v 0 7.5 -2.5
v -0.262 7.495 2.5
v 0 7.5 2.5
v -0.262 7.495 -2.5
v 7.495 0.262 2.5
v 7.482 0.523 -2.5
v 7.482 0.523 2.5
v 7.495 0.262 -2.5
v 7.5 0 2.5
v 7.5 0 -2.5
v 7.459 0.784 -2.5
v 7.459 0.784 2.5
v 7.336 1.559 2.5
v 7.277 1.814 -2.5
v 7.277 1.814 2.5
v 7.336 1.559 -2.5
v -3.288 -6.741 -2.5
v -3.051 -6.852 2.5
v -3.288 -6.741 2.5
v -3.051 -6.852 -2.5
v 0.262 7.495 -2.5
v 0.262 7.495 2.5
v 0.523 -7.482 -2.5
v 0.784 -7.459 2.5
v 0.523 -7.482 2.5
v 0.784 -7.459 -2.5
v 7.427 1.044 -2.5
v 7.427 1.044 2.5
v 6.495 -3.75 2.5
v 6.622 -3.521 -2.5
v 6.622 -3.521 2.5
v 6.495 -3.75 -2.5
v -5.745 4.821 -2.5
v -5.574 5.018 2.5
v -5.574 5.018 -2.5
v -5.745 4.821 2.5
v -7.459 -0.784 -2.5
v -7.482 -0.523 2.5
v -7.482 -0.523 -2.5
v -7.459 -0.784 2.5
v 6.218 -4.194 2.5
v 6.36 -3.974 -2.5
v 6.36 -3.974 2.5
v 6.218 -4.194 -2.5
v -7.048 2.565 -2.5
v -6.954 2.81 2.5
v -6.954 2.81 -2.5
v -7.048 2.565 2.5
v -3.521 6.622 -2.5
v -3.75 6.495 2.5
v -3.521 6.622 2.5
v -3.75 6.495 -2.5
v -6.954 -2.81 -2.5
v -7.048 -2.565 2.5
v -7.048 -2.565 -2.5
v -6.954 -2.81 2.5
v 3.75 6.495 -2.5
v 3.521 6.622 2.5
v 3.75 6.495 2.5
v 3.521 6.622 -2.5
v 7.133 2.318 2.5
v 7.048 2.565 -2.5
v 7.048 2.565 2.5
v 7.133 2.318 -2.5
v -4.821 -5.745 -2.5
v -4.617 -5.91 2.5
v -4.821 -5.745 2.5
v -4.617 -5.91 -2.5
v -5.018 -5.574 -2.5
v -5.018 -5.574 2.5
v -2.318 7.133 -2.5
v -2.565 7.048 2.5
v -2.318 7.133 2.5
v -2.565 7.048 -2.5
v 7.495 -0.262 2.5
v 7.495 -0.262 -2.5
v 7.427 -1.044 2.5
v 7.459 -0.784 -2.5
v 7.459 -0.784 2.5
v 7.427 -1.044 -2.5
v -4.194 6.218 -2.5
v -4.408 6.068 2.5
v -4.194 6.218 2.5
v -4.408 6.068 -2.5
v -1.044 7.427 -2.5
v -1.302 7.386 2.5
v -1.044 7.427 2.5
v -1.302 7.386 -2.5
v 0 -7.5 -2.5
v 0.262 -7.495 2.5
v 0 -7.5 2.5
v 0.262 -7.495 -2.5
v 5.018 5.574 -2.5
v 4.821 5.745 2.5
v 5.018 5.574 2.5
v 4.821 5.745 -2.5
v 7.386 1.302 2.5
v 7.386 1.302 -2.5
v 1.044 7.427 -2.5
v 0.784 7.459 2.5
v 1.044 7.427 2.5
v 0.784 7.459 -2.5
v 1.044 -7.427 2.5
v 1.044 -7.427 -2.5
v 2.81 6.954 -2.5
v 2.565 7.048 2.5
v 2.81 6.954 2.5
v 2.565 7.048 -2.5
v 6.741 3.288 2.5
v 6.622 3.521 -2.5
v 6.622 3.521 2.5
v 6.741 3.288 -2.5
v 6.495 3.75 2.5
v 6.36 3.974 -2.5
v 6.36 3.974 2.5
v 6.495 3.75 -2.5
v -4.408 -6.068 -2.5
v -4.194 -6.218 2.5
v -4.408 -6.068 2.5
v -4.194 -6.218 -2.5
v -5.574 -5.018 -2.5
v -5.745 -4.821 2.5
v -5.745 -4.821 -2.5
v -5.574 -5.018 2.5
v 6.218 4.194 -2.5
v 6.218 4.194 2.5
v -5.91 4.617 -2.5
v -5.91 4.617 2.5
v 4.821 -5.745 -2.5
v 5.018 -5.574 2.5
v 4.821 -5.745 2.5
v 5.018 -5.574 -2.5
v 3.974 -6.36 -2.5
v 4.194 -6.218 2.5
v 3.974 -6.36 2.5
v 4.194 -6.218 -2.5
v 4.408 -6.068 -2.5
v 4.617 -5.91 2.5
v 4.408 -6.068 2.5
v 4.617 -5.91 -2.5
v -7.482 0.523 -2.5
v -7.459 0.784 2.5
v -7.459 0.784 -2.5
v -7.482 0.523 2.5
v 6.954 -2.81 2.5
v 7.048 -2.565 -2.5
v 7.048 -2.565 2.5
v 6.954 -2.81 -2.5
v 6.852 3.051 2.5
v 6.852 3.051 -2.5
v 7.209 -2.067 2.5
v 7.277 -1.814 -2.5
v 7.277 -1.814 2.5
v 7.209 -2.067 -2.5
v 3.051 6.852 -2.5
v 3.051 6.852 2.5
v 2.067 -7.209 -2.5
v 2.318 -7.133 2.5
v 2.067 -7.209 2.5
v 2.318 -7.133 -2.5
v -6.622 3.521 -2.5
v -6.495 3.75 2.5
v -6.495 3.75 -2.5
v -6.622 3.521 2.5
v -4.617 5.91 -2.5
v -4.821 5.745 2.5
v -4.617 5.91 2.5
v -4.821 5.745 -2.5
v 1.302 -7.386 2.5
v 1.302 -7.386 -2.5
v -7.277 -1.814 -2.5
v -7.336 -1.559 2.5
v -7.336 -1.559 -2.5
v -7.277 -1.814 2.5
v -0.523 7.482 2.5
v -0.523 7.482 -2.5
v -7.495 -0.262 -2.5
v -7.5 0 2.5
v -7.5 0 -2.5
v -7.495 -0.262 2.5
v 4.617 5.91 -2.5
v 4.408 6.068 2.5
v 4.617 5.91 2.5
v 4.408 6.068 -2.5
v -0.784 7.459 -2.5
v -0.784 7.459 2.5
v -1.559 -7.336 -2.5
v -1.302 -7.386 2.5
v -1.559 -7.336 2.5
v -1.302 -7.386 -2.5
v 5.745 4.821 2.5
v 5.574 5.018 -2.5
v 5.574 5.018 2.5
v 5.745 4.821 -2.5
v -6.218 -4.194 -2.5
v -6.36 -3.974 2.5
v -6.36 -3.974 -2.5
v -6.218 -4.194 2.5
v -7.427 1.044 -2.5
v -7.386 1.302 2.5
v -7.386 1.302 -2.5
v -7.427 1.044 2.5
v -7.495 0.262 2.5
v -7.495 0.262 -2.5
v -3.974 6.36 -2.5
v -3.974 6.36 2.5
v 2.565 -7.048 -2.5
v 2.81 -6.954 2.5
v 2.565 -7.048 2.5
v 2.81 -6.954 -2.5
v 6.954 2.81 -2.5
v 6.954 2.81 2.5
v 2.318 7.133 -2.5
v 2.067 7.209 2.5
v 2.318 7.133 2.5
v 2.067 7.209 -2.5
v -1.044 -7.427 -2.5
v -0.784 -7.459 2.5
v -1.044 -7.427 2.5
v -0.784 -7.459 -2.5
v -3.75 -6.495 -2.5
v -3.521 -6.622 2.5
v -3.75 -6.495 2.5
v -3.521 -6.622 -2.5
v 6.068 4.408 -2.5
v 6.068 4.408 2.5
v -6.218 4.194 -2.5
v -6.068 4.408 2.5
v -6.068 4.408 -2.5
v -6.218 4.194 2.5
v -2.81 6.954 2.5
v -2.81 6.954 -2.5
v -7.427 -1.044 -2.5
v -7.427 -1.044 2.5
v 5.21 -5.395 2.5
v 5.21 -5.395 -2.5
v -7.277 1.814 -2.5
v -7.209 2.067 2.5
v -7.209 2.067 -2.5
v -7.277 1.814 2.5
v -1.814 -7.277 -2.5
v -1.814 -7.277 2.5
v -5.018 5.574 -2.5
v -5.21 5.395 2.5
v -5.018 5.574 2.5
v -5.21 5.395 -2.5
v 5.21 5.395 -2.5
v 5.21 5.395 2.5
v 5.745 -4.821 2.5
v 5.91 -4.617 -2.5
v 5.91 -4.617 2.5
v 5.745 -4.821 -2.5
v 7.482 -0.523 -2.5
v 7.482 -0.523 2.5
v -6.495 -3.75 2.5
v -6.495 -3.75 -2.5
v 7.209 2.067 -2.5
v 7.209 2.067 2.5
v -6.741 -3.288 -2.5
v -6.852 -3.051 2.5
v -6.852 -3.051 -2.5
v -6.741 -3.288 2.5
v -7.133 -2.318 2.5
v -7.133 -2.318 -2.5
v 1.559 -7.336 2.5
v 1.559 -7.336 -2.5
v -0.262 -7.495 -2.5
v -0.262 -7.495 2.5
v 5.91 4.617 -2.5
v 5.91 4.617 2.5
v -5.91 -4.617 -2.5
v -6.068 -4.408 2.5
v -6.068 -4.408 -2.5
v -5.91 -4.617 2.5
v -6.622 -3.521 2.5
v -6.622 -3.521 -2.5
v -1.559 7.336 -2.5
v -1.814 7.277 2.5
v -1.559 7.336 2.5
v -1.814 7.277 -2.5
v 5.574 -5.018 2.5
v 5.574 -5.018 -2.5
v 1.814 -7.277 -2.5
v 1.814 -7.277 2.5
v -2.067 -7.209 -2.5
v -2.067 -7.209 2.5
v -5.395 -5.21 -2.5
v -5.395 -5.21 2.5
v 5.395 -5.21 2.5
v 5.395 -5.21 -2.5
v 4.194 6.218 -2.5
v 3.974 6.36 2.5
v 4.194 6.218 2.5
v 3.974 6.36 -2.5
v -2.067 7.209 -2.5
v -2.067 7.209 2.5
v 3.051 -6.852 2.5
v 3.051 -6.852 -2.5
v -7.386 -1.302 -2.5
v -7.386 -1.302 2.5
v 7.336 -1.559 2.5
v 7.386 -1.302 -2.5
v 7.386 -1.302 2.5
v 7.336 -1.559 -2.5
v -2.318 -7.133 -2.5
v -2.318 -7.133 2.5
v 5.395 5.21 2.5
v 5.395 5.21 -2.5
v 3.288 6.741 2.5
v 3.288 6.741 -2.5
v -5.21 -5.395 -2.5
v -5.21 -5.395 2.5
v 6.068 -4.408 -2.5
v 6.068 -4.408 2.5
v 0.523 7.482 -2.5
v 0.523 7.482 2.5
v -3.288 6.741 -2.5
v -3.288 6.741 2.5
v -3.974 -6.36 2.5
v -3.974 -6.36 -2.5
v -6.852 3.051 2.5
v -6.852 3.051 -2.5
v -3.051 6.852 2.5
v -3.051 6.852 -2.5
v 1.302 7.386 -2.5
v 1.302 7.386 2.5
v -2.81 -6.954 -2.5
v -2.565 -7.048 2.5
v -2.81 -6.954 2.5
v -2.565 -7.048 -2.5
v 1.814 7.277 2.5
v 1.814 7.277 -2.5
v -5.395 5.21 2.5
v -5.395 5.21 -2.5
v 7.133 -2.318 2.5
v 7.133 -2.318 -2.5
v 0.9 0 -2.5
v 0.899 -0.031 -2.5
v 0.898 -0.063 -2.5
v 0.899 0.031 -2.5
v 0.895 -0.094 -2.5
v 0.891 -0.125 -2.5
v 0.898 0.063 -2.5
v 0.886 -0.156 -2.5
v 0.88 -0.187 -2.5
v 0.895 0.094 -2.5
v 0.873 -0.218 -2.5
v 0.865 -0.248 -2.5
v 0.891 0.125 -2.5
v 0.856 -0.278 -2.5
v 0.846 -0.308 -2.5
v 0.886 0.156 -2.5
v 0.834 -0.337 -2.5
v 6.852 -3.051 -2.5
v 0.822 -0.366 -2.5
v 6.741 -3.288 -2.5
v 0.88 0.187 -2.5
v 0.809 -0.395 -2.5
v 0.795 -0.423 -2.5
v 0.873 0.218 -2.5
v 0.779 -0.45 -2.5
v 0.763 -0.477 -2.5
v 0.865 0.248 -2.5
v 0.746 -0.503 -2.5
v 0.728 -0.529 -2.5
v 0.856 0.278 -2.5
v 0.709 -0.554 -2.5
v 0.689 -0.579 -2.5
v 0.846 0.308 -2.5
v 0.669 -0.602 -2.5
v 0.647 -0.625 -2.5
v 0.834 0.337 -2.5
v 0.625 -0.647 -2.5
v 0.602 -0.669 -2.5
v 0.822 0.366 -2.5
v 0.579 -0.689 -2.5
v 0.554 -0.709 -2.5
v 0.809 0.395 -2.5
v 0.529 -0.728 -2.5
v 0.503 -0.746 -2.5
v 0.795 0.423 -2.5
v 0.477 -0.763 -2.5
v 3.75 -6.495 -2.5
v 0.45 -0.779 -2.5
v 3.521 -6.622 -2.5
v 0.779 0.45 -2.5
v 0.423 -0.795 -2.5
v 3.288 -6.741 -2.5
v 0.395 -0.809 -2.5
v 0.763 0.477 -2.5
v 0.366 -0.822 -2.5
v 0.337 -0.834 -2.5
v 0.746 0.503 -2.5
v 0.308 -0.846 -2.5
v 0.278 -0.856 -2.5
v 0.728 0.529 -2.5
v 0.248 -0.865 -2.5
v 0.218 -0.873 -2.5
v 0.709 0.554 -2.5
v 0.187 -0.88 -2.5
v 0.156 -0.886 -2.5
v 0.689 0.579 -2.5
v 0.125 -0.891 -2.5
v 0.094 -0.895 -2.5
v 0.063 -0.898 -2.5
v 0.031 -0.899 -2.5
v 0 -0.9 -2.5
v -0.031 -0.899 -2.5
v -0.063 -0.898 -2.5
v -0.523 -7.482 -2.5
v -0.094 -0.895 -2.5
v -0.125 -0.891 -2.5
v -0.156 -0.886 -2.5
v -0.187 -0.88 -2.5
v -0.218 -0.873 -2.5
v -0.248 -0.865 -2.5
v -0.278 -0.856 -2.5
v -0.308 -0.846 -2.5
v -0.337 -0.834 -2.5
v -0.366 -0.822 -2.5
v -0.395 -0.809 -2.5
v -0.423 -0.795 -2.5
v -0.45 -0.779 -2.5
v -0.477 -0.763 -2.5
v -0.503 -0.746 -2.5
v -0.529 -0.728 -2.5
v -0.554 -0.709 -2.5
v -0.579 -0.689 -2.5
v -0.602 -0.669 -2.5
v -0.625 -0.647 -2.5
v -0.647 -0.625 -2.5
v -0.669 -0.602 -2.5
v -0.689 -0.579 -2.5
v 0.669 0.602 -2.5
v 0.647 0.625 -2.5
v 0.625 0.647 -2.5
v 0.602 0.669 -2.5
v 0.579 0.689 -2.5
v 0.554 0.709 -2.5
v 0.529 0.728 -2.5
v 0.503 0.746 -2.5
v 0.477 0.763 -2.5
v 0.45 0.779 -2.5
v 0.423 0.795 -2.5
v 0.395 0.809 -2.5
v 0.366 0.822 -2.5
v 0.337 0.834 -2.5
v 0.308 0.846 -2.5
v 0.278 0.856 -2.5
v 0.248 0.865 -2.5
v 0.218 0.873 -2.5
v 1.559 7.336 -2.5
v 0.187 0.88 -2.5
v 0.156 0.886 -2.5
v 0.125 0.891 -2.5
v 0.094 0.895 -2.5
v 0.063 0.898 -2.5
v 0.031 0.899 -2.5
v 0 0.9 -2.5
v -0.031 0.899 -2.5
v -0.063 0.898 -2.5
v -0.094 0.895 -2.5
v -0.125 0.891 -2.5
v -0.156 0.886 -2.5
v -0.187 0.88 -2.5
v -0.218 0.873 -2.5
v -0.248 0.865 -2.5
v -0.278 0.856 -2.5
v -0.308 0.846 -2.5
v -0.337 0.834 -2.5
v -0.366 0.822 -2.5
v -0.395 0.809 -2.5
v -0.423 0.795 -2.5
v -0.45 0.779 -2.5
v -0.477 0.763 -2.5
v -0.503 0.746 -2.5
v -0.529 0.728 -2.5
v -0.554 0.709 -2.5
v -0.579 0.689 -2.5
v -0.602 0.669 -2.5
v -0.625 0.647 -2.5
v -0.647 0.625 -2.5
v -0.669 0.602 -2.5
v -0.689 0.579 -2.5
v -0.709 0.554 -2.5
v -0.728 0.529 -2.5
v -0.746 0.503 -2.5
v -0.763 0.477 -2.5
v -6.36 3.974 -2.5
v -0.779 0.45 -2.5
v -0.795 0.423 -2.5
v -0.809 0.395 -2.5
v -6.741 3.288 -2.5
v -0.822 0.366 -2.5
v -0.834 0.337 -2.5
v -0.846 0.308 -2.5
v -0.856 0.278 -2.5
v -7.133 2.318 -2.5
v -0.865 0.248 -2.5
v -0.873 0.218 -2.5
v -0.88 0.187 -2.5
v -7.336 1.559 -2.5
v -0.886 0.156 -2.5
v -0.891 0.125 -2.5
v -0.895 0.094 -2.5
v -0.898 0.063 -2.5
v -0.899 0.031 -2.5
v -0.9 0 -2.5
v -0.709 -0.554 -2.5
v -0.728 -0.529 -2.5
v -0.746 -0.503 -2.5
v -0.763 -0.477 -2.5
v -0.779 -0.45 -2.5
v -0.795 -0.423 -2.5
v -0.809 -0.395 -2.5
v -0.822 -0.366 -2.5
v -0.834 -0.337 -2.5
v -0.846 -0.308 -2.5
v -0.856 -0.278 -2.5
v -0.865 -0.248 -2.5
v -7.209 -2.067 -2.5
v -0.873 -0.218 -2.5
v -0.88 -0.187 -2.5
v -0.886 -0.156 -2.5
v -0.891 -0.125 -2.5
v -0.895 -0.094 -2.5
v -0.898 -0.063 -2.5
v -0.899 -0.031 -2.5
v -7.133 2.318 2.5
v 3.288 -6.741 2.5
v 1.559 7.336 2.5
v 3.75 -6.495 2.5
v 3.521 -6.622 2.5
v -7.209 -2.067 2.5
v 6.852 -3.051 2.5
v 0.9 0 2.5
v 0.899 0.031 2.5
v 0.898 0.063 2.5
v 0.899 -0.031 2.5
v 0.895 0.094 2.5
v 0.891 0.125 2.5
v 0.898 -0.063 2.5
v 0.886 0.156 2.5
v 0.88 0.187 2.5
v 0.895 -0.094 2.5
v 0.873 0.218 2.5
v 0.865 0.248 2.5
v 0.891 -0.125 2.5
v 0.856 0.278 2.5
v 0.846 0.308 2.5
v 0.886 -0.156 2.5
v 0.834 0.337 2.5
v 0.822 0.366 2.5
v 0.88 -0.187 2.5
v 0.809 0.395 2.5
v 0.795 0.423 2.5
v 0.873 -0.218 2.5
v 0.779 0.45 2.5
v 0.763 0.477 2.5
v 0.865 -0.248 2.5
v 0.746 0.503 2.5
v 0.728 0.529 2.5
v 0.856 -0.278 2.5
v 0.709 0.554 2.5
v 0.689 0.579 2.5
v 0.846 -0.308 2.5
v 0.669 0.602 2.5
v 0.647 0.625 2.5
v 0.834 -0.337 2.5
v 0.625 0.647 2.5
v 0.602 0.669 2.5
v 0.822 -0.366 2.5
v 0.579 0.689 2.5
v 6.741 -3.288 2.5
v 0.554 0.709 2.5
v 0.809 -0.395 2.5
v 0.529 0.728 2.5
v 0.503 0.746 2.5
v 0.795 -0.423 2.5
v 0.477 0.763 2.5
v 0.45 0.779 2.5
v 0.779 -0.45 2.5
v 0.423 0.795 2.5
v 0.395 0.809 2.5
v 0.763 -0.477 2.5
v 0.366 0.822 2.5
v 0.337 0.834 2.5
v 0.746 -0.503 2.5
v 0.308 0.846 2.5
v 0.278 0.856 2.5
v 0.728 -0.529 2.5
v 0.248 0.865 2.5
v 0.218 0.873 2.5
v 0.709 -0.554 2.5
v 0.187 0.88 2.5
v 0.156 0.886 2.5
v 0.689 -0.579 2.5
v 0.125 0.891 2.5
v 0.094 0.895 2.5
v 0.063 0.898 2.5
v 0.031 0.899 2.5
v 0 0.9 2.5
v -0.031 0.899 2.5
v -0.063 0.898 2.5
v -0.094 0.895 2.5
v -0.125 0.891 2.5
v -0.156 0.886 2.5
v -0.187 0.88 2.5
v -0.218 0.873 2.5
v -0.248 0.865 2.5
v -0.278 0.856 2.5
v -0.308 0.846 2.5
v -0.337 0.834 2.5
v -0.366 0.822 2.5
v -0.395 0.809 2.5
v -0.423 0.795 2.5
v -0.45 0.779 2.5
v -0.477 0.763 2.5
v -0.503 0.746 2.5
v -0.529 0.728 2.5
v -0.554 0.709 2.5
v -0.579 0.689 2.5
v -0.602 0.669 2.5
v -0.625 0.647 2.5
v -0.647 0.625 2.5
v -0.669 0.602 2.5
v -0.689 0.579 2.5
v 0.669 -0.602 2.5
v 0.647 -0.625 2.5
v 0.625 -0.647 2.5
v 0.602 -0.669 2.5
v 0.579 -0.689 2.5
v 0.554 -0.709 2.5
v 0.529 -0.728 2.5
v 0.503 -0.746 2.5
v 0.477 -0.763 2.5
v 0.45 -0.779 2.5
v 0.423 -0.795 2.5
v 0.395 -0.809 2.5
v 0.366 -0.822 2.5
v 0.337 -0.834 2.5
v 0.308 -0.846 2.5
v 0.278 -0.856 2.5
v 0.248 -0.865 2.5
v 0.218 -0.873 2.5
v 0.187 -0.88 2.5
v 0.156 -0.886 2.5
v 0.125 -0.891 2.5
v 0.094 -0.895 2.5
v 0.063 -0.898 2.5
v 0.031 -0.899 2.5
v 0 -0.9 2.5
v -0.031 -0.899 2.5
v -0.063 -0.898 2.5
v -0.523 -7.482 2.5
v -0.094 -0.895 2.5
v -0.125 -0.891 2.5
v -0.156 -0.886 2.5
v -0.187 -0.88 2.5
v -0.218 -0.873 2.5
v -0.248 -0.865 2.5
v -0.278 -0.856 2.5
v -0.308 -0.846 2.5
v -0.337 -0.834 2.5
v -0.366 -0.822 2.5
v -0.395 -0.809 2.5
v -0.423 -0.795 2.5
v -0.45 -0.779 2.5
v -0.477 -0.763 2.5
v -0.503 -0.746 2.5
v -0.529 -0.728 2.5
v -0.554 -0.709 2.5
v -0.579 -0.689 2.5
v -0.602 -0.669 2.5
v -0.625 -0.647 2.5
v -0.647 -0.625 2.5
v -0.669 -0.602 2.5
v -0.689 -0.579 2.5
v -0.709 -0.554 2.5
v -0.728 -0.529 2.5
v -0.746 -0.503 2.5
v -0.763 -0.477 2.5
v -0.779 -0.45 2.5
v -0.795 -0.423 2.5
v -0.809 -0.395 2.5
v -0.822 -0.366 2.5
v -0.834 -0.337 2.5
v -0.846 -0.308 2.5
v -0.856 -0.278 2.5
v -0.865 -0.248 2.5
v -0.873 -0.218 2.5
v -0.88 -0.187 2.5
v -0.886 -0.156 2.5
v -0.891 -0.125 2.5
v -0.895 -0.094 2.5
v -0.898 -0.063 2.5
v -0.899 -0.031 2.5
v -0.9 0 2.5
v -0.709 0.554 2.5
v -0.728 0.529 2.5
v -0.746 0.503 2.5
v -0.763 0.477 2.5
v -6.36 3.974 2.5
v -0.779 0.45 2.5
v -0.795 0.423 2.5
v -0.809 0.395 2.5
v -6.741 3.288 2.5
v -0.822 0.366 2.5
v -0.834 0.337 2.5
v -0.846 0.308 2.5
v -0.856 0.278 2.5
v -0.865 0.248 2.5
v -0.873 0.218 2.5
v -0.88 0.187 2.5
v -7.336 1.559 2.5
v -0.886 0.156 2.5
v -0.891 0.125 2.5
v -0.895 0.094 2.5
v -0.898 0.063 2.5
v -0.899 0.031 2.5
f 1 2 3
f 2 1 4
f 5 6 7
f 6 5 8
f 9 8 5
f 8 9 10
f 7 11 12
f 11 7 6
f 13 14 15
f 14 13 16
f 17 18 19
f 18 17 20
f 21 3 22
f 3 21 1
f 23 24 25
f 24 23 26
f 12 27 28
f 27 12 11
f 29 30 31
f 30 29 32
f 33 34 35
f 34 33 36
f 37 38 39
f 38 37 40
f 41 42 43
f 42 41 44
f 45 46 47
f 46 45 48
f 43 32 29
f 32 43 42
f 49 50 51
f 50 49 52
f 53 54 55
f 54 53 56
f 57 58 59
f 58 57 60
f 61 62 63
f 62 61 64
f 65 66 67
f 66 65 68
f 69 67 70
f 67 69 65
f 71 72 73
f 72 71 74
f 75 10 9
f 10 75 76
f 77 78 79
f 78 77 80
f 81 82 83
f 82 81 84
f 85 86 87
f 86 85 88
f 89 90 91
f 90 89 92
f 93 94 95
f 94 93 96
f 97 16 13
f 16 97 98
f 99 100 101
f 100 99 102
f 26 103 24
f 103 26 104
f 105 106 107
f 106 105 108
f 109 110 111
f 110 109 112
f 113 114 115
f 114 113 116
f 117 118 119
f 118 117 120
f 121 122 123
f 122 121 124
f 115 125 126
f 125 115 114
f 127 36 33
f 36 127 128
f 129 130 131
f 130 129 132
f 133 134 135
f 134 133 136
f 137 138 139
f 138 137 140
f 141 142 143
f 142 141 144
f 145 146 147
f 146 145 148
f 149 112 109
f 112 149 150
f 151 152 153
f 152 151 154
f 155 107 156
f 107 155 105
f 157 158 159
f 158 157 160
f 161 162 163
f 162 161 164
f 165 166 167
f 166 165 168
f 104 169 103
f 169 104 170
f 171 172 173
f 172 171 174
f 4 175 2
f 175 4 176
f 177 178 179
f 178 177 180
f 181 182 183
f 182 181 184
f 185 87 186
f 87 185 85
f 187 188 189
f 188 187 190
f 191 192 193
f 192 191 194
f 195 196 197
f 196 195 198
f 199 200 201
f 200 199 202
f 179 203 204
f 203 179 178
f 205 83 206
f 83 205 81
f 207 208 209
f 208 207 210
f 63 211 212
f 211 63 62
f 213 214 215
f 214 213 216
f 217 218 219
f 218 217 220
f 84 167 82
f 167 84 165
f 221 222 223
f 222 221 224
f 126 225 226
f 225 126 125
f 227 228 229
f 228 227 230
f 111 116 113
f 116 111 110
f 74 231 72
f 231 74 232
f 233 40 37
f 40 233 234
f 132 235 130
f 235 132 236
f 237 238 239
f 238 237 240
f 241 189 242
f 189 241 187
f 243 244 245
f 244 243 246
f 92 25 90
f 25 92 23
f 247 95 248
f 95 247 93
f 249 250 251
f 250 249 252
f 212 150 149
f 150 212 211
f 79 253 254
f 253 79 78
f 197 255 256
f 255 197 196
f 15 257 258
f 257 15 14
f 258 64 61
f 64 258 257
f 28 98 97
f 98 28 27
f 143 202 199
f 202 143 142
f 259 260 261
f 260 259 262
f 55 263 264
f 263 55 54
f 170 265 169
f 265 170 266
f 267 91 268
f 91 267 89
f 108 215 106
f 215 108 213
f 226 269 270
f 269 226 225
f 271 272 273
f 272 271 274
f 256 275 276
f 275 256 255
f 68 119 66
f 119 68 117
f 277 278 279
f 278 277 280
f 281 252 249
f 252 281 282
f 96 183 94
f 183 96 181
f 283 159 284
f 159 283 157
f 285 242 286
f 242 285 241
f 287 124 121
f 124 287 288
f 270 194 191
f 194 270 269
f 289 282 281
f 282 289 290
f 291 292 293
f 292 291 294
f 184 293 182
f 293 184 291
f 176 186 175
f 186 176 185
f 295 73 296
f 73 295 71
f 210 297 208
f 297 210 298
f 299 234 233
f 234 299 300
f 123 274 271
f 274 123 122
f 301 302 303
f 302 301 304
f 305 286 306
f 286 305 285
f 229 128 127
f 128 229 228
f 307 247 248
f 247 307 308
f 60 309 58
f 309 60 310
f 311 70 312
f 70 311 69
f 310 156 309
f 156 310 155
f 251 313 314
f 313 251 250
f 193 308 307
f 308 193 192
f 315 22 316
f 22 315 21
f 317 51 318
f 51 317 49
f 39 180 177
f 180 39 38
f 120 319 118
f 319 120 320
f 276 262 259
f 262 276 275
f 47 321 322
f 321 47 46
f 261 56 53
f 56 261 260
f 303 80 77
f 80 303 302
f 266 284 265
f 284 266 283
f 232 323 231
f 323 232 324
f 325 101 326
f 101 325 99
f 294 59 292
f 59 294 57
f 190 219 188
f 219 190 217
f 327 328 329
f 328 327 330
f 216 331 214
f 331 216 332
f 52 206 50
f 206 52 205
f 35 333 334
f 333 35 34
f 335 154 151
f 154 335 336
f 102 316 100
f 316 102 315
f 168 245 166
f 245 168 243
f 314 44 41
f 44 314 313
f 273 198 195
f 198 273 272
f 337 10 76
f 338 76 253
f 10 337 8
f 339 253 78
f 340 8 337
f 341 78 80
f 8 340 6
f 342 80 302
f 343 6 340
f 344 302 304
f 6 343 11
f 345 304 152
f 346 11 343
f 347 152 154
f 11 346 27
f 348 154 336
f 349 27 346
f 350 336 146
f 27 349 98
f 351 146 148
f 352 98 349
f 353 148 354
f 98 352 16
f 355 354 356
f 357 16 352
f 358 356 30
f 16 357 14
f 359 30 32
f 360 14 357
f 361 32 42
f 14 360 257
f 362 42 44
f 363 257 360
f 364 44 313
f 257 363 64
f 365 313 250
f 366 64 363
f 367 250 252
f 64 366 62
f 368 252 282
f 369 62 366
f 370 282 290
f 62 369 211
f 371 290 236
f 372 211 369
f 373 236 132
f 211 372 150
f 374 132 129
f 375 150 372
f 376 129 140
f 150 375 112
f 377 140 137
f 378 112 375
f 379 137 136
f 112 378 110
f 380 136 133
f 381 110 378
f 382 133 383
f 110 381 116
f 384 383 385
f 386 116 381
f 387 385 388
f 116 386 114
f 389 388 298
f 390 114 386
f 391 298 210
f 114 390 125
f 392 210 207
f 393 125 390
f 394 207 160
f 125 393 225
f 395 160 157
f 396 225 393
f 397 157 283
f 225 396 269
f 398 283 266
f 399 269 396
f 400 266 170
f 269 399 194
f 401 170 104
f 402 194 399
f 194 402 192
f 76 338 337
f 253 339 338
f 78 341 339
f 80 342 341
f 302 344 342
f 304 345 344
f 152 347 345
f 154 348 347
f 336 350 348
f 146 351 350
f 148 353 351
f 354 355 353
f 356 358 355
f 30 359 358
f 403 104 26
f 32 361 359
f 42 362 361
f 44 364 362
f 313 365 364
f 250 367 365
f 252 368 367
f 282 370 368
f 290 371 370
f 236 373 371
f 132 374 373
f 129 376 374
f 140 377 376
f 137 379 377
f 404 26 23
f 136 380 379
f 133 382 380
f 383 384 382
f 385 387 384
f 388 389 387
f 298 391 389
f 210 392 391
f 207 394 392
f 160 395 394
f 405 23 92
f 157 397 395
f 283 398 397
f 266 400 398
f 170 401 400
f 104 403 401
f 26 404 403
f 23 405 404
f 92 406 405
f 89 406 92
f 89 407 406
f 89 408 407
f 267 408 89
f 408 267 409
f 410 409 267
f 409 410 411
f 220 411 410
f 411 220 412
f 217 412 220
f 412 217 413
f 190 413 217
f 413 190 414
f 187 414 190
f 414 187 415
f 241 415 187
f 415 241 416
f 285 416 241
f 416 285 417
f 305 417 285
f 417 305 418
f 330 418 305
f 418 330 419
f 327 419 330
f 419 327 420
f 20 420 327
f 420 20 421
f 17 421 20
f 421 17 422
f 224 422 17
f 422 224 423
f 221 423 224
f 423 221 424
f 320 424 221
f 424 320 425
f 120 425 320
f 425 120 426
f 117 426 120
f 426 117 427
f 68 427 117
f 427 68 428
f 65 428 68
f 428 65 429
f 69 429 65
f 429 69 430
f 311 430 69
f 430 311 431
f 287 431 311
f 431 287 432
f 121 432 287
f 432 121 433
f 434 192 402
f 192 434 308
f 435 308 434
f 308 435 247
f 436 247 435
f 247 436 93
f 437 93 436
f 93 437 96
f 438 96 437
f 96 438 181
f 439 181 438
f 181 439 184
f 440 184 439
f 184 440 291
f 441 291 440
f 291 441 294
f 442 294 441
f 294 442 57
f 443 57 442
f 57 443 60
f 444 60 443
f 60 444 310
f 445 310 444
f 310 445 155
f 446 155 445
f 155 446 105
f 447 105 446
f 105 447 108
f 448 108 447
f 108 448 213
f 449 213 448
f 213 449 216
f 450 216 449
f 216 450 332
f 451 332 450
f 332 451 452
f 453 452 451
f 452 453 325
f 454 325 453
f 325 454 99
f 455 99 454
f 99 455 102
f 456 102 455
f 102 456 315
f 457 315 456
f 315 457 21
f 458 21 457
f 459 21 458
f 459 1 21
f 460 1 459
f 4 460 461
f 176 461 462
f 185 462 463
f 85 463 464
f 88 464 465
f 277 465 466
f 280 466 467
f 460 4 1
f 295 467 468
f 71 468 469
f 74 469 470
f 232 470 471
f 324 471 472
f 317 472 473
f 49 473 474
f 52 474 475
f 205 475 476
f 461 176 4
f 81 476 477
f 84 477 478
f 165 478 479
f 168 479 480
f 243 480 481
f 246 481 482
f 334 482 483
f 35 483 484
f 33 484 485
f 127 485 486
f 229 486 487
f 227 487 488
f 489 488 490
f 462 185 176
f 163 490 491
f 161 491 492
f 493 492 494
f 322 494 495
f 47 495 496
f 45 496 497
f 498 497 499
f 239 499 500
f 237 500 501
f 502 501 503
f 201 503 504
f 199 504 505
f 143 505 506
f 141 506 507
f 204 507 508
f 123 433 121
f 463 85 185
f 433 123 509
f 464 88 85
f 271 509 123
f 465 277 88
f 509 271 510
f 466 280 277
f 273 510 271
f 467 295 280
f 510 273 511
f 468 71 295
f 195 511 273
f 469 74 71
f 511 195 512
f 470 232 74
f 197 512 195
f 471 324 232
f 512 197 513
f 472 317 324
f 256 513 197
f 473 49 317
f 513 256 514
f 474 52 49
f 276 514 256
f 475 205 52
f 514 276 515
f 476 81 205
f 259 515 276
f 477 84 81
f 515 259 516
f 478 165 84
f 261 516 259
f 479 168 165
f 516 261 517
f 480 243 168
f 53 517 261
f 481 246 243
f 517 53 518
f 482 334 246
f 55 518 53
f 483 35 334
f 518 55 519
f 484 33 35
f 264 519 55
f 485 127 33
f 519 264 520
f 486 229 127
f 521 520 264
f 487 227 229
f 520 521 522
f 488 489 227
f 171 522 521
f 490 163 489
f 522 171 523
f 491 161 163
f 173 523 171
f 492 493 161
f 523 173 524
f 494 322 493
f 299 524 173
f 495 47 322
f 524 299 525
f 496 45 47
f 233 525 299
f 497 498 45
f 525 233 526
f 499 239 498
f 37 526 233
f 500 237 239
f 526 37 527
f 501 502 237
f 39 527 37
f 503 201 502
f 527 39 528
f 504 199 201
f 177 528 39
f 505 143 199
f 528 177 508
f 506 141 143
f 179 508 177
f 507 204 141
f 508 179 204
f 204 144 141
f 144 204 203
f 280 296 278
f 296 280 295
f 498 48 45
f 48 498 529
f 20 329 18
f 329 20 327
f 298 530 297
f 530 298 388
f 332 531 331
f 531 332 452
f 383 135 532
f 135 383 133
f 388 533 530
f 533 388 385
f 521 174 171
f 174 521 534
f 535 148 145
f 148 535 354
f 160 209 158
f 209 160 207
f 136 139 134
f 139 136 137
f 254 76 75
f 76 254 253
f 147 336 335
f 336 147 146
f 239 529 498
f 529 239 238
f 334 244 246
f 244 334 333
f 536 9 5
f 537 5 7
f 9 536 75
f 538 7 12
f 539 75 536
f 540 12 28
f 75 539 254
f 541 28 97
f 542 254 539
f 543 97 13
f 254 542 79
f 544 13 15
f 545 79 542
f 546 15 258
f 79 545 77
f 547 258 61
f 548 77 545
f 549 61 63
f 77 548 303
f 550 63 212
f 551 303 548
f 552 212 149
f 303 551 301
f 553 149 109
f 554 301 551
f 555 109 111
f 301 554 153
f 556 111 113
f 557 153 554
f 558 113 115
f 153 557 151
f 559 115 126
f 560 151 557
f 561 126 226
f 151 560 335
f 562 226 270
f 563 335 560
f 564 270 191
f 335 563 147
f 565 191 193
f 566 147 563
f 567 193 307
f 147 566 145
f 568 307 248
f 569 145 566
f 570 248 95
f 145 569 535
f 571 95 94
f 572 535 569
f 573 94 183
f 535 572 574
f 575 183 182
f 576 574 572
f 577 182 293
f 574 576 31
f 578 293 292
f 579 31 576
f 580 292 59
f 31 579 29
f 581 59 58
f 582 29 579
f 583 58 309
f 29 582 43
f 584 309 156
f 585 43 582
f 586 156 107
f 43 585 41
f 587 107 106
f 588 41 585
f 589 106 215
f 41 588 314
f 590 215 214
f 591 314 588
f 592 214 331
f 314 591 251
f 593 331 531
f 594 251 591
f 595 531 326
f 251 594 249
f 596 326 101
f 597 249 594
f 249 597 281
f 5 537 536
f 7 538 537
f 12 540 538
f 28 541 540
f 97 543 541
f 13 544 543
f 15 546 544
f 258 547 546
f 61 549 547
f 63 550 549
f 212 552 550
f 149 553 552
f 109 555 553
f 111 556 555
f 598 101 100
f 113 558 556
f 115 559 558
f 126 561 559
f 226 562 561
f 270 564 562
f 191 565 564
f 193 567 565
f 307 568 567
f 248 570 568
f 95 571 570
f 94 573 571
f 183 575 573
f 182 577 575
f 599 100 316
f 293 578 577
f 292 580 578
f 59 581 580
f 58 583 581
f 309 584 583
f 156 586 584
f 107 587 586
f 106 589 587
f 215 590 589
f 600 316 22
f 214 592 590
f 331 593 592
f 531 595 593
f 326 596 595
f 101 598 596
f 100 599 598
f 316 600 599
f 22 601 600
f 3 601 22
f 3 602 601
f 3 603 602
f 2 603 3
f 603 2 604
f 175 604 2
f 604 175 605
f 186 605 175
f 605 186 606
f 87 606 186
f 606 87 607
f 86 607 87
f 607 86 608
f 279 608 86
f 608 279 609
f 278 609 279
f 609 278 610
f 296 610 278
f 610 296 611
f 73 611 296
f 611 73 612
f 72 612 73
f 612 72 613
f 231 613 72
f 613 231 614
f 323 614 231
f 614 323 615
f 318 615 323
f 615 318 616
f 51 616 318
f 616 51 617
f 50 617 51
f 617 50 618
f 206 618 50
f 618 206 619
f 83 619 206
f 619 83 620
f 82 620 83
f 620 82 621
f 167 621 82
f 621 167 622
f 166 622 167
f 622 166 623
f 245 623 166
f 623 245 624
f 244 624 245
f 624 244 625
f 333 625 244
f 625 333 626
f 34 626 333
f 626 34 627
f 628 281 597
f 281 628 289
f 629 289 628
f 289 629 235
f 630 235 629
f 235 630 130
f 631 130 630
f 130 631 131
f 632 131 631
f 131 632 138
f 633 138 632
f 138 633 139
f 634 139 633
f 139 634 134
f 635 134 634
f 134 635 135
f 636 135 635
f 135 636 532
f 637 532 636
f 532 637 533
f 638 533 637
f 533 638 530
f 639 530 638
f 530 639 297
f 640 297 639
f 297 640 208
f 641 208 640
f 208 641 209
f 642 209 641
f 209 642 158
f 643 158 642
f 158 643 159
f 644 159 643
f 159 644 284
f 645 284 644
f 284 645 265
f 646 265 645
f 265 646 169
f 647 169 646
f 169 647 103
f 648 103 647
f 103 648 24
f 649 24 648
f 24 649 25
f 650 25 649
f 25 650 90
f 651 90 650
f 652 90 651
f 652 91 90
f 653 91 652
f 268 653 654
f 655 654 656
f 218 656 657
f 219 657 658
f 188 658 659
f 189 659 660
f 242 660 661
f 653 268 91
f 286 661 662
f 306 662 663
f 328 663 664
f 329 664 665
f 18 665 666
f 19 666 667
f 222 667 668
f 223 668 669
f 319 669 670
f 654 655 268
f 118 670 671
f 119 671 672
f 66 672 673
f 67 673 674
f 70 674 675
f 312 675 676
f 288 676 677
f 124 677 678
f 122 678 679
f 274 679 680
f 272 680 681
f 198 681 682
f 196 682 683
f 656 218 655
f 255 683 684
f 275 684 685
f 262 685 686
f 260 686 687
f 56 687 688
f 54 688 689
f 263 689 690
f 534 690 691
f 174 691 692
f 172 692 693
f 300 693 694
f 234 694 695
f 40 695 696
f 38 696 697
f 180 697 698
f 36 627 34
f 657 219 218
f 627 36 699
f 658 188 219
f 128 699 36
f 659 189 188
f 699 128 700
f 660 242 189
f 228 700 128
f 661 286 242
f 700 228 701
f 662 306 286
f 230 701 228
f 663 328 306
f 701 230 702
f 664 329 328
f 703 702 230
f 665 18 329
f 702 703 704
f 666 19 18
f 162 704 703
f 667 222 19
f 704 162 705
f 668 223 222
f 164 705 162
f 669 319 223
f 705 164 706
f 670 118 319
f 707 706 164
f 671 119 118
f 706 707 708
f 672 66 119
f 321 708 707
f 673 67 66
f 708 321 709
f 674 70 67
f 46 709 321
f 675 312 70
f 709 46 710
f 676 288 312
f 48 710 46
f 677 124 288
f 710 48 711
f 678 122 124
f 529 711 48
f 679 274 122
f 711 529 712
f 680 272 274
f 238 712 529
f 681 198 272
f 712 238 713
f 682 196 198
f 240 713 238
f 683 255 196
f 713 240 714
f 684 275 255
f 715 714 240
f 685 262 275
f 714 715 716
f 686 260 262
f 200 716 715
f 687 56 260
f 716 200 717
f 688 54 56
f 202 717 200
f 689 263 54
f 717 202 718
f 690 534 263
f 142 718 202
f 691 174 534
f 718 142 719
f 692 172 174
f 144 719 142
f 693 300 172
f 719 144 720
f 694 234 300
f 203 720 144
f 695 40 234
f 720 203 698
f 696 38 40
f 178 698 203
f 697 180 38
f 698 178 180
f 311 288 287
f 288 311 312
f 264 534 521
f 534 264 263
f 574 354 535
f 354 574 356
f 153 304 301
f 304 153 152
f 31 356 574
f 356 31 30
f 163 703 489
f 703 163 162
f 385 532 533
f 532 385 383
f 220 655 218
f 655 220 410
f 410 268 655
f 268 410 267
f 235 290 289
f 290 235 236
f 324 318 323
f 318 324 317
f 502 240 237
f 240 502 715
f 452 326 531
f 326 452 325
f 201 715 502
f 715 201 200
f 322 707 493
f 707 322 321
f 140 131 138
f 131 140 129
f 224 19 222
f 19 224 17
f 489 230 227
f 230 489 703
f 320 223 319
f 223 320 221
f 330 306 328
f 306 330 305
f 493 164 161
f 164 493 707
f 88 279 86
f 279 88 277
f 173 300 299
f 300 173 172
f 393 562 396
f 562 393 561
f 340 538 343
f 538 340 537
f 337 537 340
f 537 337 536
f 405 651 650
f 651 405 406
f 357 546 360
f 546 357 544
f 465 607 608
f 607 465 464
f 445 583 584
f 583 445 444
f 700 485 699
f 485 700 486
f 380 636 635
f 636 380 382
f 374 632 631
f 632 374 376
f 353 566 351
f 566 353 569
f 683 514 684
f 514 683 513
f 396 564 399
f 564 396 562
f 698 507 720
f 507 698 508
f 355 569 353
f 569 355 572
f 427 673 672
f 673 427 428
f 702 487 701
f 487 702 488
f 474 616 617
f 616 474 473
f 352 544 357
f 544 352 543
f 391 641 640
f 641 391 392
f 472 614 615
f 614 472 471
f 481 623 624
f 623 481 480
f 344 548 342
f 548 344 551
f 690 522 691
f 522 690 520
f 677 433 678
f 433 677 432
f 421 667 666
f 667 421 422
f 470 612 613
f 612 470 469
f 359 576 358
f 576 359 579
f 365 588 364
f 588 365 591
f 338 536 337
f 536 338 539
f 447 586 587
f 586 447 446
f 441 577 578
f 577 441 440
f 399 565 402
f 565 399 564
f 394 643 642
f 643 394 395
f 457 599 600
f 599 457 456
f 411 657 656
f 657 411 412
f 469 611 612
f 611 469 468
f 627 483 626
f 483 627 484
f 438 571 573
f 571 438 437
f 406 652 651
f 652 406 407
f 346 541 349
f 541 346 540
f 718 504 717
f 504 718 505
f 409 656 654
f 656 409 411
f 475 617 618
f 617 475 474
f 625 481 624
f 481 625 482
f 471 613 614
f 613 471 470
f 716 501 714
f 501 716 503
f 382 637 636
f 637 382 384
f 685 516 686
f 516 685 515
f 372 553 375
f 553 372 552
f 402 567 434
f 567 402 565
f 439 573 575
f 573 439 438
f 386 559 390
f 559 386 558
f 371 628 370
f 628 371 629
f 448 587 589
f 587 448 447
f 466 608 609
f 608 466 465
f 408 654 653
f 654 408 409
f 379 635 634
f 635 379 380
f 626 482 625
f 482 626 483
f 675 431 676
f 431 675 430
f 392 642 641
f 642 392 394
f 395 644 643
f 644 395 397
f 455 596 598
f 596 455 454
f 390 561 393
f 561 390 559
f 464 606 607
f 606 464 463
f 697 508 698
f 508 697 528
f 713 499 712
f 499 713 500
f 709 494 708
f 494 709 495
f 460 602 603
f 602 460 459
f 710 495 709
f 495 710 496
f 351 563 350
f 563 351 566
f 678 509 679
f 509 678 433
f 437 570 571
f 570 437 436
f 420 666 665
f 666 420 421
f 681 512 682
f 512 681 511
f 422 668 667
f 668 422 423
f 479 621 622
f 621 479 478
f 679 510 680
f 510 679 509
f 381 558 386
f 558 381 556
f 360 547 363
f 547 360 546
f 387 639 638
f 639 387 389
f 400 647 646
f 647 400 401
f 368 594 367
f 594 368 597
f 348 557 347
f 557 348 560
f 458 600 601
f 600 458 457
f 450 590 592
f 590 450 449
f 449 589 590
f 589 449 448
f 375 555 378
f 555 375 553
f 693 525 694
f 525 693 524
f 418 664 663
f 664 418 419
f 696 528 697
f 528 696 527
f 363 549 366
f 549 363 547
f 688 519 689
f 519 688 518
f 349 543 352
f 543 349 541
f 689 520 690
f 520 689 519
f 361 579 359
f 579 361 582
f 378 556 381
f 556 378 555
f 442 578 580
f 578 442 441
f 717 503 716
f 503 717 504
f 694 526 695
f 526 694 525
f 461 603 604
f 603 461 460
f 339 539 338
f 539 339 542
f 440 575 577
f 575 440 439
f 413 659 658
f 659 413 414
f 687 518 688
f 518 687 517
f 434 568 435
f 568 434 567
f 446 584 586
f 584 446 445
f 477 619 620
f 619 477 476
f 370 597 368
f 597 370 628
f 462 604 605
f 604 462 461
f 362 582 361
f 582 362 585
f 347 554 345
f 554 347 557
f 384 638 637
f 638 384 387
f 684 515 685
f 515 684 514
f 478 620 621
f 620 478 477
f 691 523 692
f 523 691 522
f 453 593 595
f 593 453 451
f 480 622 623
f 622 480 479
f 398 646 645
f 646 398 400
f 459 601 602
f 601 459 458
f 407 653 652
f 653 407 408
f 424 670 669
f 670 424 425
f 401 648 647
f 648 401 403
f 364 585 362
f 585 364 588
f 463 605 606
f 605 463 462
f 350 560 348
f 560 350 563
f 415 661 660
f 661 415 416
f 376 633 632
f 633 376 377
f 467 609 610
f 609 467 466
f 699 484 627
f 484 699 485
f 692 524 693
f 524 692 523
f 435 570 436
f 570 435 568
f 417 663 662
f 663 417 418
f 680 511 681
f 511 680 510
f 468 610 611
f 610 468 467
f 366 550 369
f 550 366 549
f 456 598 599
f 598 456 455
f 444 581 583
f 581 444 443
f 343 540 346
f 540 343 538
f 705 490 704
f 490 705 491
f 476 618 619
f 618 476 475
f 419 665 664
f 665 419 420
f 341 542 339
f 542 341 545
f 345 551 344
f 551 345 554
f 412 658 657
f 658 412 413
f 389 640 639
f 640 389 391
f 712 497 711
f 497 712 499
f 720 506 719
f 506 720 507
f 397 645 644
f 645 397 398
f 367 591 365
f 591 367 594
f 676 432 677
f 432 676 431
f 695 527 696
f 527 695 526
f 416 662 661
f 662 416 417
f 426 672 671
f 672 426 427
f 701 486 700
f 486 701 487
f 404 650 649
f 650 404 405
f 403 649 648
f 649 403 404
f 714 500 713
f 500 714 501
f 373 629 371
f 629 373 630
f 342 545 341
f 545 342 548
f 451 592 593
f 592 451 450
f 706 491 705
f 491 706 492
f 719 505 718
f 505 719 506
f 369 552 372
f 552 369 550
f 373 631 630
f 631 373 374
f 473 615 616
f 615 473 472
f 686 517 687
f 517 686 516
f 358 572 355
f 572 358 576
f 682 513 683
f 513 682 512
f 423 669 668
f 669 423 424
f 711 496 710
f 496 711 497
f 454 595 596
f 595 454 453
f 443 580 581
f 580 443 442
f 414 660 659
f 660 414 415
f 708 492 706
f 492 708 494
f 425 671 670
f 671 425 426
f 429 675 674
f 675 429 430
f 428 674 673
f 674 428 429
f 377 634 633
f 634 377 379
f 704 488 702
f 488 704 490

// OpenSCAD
//cube([120,120,3], center = true);
//translate([-45,-45,0])cylinder(h = 3, r=15, $fn = 180, center = true);
//rotate_extrude(convexity = 10, $fn = A) translate([20+1.5, 0, 0])circle(d = 3, $fn = B);


difference(){
    
translate([0,0,0])cylinder(h = 5, d=15, $fn = 180, center = true);

translate([0,0,0])cylinder(h = 10, d=1.8, $fn = 180, center = true);
    

    
    


}



 
